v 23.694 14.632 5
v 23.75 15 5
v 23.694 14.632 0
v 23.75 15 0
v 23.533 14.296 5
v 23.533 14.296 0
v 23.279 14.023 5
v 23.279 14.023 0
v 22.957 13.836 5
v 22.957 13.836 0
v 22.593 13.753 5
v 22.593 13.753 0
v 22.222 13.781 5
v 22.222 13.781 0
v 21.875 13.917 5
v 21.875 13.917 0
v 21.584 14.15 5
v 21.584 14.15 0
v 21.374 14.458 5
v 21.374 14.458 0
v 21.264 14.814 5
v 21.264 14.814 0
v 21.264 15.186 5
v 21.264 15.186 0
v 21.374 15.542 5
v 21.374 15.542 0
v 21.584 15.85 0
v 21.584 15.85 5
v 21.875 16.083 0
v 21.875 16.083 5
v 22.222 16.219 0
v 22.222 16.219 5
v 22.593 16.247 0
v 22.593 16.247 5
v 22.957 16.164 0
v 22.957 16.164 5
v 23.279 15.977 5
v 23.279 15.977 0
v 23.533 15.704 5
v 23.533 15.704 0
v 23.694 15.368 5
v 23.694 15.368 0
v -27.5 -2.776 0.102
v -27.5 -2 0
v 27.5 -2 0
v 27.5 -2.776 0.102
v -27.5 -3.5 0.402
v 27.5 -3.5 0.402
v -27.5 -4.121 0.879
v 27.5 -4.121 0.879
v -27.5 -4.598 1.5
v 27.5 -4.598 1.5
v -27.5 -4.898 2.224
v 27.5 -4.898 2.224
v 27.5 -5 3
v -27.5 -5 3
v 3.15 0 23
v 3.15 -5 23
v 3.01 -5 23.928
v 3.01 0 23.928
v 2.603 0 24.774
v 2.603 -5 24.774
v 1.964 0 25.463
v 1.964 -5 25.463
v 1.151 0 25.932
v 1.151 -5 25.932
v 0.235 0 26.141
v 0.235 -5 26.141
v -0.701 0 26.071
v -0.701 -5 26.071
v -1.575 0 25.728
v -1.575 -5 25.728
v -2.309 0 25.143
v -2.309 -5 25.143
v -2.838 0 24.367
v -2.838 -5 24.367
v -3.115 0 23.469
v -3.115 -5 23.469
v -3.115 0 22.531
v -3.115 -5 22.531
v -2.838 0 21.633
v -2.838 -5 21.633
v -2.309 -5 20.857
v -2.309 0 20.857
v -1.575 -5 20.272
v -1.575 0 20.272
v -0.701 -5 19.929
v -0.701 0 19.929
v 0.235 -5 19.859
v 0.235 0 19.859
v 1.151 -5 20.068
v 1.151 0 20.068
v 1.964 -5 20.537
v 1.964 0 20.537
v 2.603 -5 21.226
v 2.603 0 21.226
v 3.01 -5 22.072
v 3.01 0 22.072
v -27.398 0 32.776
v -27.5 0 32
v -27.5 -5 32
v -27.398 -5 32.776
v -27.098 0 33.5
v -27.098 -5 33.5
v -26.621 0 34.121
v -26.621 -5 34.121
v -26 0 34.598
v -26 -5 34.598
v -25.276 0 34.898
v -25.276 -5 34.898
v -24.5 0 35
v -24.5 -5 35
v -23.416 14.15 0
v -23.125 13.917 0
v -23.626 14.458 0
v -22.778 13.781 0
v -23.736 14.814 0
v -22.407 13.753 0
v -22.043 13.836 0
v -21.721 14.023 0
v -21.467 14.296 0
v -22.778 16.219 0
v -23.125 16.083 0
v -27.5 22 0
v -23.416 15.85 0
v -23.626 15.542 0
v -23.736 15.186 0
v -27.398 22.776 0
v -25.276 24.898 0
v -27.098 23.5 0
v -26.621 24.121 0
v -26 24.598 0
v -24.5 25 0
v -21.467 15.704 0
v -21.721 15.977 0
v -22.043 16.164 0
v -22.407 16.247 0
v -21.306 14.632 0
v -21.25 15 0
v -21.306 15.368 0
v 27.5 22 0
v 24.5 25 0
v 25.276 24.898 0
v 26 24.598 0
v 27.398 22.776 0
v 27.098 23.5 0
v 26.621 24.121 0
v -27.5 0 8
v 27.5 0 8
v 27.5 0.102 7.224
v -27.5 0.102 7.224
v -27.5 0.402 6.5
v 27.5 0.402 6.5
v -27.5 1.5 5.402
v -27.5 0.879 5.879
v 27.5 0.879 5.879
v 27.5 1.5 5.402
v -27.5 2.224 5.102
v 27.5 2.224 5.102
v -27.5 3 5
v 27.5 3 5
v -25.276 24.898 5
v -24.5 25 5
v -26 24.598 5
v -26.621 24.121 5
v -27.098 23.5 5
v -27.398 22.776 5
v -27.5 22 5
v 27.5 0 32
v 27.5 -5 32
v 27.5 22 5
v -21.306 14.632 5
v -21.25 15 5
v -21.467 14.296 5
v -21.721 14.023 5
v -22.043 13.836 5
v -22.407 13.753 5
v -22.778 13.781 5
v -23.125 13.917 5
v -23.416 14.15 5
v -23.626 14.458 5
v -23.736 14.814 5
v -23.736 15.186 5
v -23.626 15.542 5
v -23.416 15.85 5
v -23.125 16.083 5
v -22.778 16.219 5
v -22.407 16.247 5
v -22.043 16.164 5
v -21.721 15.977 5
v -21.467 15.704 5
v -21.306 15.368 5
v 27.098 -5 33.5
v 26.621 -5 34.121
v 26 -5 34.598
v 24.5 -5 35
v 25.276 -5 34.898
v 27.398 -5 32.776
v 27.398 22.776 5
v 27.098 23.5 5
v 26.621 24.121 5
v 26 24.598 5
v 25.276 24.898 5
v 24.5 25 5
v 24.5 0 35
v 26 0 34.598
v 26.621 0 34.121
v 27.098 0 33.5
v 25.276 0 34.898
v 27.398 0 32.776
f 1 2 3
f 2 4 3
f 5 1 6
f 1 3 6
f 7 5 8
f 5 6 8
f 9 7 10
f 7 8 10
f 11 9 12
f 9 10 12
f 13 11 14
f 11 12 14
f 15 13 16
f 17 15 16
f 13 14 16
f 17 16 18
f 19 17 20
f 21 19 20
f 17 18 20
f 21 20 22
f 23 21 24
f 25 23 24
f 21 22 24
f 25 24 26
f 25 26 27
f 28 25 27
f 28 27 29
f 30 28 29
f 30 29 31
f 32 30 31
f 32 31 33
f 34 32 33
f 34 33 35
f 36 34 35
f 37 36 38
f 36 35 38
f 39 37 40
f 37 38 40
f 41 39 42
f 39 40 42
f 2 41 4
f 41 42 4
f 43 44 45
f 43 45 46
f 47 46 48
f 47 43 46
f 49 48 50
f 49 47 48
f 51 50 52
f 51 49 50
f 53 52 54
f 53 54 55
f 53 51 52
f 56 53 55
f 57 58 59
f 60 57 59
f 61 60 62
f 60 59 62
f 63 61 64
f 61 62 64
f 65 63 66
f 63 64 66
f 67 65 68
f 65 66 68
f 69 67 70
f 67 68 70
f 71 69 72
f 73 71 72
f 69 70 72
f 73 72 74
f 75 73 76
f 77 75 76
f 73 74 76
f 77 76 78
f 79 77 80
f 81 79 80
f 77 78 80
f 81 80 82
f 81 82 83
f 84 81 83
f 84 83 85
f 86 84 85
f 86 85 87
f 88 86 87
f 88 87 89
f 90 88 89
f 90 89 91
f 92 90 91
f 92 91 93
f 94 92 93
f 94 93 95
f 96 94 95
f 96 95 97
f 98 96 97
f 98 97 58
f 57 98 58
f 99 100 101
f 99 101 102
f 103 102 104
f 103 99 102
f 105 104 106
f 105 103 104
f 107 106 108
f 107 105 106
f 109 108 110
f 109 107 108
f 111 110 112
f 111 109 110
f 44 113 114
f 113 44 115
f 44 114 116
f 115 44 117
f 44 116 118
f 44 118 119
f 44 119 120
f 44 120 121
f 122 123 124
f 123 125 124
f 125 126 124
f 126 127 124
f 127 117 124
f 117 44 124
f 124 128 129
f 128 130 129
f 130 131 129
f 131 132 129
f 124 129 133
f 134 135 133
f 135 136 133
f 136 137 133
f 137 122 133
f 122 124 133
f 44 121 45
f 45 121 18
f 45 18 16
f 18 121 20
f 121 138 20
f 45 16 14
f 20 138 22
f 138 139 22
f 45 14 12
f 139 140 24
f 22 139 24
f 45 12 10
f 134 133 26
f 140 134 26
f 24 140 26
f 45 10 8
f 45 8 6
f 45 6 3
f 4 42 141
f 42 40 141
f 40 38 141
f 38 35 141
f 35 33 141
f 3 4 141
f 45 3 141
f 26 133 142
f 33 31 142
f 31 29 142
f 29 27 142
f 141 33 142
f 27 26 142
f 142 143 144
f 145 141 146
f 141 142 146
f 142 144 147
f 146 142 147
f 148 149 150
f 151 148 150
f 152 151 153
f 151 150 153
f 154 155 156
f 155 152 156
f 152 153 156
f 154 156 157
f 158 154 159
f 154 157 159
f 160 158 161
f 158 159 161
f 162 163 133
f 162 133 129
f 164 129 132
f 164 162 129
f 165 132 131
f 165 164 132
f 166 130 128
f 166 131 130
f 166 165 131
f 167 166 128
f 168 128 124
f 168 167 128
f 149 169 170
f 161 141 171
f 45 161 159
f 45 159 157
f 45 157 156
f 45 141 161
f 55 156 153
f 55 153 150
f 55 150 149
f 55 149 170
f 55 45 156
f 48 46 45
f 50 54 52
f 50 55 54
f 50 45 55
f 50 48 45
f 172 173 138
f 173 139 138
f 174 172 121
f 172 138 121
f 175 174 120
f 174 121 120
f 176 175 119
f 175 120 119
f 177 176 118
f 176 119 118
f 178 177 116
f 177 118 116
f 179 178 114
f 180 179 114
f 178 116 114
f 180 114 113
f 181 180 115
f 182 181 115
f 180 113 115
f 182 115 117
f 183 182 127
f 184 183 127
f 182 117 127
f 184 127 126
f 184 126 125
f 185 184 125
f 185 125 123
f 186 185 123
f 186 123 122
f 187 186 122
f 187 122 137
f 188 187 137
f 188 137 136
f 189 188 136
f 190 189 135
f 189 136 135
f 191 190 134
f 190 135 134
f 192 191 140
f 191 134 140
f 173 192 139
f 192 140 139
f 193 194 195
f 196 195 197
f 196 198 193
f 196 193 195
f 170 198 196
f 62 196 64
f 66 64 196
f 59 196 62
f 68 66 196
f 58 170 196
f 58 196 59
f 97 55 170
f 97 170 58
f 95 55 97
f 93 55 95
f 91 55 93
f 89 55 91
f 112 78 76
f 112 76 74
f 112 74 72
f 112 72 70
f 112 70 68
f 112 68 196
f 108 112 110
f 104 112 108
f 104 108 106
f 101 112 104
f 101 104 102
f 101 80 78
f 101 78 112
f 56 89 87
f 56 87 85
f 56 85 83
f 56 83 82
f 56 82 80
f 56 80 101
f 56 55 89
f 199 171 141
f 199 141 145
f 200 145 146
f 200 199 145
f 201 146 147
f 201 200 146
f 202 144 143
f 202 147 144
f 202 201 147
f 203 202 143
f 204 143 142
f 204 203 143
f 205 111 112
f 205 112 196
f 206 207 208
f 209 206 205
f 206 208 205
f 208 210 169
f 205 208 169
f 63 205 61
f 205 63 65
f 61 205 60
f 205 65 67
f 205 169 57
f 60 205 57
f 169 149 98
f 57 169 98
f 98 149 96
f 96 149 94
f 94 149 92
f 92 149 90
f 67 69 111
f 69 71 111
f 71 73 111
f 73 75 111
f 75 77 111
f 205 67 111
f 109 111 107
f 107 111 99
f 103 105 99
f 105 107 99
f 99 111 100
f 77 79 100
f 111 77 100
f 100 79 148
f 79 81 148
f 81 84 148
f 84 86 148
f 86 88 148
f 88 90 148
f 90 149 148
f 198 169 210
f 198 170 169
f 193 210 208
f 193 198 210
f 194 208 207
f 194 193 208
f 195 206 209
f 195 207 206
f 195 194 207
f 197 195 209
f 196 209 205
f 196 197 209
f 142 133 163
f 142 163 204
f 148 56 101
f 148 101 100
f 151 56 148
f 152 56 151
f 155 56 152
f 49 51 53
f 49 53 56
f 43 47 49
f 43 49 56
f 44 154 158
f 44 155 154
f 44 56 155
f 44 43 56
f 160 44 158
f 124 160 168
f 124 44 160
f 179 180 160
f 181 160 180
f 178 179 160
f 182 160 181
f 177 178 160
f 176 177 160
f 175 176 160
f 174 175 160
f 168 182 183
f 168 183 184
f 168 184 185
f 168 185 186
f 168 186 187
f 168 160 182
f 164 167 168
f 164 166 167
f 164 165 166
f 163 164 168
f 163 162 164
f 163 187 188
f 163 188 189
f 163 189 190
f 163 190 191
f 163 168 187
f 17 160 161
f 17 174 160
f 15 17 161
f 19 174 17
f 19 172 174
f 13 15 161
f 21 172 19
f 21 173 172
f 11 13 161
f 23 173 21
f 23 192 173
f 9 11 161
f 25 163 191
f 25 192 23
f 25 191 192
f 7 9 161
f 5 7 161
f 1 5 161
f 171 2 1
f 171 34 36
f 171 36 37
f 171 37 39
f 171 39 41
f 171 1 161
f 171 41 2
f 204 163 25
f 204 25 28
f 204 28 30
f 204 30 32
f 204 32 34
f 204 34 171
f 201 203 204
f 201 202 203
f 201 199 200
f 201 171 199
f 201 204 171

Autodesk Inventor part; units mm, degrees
ref_plane "YZ Plane" through (0, 0, 0) normal (1, 0, 0) x (0, 1, 0)
ref_plane "XZ Plane" through (0, 0, 0) normal (0, 1, 0) x (-1, 0, 0)
ref_plane "XY Plane" through (0, 0, 0) normal (0, 0, 1) x (1, 0, 0)
sketch "スケッチ1" plane through (0, 0, 0) normal (0, 0, 1) x (1, 0, 0)
  line L0 (-27.5, 25) -> (27.5, 25)
  line L1 (27.5, 25) -> (27.5, 0)
  line L2 (27.5, 0) -> (-27.5, 0)
  line L3 (-27.5, 0) -> (-27.5, 25)
  line L4 (-27.5, 0) -> (27.5, 0)
  line L5 (27.5, 0) -> (27.5, -5)
  line L6 (27.5, -5) -> (-27.5, -5)
  line L7 (-27.5, -5) -> (-27.5, 0)
  circle A0 centre (-22.5, 15) radius 1.25
  line L8 (-27.3778, 15) -> (27.6222, 15)
  line L9 (0, 25) -> (0, -5)
  circle A1 centre (22.5, 15) radius 1.25
  point P0 (0, 0)
  point P1 (0, 0)
  point P2 (0, 0)
  dimension "d0" = 25
  dimension "d1" = 55
  dimension "d2" = 5
  dimension "d4" = 22.5
  dimension "d5" = 2.5
  dimension "d17" = 10
extrude "押し出し1" add sketch "スケッチ1" along normal blind 5 contours L0 L9 L2 L3 | L0 L1 L8 A1 L9 | L8 A1 L1 L2 L9
extrude "押し出し2" add sketch "スケッチ1" along normal blind 35 contours L2 L9 L6 L7 | L2 L5 L6 L9
sketch "スケッチ2" plane through (-27.5, -5, 0) normal (0, -1, 0) x (1, 0, 0)
  line L0 (0, 35) -> (55, 35) projected
  line L1 (54.9263, 23) -> (-0.0737, 23)
  line L2 (27.5, 35) -> (27.5, 0)
  circle A0 centre (27.5, 23) radius 3.15
  dimension "d15" = 6.3
  dimension "d18" = 12
extrude "押し出し3" cut sketch "スケッチ2" against normal blind 30
fillet "フィレット1" radius 3 2 edges at (0, -5, 0) (0, 0, 5)
fillet "フィレット2" radius 3 4 edges at (27.5, -2.5, 35) (-27.5, -2.5, 35) (27.5, 25, 2.5) (-27.5, 25, 2.5)
equation "\"BendRadius\" = Thickness"
equation "\"BendReliefWidth\" = Thickness"
equation "\"BendReliefDepth\" = 0.5 * Thickness"
equation "\"CornerReliefSize\" = 4 * Thickness"
equation "\"MinimumRemnant\" = 2 * Thickness"
equation "\"TransitionRadius\" = BendRadius"
equation "\"JacobiRadiusSize\" = BendRadius"
equation "\"GapSize\" = Thickness"
equation "\"Thickness\" = 0.5"
